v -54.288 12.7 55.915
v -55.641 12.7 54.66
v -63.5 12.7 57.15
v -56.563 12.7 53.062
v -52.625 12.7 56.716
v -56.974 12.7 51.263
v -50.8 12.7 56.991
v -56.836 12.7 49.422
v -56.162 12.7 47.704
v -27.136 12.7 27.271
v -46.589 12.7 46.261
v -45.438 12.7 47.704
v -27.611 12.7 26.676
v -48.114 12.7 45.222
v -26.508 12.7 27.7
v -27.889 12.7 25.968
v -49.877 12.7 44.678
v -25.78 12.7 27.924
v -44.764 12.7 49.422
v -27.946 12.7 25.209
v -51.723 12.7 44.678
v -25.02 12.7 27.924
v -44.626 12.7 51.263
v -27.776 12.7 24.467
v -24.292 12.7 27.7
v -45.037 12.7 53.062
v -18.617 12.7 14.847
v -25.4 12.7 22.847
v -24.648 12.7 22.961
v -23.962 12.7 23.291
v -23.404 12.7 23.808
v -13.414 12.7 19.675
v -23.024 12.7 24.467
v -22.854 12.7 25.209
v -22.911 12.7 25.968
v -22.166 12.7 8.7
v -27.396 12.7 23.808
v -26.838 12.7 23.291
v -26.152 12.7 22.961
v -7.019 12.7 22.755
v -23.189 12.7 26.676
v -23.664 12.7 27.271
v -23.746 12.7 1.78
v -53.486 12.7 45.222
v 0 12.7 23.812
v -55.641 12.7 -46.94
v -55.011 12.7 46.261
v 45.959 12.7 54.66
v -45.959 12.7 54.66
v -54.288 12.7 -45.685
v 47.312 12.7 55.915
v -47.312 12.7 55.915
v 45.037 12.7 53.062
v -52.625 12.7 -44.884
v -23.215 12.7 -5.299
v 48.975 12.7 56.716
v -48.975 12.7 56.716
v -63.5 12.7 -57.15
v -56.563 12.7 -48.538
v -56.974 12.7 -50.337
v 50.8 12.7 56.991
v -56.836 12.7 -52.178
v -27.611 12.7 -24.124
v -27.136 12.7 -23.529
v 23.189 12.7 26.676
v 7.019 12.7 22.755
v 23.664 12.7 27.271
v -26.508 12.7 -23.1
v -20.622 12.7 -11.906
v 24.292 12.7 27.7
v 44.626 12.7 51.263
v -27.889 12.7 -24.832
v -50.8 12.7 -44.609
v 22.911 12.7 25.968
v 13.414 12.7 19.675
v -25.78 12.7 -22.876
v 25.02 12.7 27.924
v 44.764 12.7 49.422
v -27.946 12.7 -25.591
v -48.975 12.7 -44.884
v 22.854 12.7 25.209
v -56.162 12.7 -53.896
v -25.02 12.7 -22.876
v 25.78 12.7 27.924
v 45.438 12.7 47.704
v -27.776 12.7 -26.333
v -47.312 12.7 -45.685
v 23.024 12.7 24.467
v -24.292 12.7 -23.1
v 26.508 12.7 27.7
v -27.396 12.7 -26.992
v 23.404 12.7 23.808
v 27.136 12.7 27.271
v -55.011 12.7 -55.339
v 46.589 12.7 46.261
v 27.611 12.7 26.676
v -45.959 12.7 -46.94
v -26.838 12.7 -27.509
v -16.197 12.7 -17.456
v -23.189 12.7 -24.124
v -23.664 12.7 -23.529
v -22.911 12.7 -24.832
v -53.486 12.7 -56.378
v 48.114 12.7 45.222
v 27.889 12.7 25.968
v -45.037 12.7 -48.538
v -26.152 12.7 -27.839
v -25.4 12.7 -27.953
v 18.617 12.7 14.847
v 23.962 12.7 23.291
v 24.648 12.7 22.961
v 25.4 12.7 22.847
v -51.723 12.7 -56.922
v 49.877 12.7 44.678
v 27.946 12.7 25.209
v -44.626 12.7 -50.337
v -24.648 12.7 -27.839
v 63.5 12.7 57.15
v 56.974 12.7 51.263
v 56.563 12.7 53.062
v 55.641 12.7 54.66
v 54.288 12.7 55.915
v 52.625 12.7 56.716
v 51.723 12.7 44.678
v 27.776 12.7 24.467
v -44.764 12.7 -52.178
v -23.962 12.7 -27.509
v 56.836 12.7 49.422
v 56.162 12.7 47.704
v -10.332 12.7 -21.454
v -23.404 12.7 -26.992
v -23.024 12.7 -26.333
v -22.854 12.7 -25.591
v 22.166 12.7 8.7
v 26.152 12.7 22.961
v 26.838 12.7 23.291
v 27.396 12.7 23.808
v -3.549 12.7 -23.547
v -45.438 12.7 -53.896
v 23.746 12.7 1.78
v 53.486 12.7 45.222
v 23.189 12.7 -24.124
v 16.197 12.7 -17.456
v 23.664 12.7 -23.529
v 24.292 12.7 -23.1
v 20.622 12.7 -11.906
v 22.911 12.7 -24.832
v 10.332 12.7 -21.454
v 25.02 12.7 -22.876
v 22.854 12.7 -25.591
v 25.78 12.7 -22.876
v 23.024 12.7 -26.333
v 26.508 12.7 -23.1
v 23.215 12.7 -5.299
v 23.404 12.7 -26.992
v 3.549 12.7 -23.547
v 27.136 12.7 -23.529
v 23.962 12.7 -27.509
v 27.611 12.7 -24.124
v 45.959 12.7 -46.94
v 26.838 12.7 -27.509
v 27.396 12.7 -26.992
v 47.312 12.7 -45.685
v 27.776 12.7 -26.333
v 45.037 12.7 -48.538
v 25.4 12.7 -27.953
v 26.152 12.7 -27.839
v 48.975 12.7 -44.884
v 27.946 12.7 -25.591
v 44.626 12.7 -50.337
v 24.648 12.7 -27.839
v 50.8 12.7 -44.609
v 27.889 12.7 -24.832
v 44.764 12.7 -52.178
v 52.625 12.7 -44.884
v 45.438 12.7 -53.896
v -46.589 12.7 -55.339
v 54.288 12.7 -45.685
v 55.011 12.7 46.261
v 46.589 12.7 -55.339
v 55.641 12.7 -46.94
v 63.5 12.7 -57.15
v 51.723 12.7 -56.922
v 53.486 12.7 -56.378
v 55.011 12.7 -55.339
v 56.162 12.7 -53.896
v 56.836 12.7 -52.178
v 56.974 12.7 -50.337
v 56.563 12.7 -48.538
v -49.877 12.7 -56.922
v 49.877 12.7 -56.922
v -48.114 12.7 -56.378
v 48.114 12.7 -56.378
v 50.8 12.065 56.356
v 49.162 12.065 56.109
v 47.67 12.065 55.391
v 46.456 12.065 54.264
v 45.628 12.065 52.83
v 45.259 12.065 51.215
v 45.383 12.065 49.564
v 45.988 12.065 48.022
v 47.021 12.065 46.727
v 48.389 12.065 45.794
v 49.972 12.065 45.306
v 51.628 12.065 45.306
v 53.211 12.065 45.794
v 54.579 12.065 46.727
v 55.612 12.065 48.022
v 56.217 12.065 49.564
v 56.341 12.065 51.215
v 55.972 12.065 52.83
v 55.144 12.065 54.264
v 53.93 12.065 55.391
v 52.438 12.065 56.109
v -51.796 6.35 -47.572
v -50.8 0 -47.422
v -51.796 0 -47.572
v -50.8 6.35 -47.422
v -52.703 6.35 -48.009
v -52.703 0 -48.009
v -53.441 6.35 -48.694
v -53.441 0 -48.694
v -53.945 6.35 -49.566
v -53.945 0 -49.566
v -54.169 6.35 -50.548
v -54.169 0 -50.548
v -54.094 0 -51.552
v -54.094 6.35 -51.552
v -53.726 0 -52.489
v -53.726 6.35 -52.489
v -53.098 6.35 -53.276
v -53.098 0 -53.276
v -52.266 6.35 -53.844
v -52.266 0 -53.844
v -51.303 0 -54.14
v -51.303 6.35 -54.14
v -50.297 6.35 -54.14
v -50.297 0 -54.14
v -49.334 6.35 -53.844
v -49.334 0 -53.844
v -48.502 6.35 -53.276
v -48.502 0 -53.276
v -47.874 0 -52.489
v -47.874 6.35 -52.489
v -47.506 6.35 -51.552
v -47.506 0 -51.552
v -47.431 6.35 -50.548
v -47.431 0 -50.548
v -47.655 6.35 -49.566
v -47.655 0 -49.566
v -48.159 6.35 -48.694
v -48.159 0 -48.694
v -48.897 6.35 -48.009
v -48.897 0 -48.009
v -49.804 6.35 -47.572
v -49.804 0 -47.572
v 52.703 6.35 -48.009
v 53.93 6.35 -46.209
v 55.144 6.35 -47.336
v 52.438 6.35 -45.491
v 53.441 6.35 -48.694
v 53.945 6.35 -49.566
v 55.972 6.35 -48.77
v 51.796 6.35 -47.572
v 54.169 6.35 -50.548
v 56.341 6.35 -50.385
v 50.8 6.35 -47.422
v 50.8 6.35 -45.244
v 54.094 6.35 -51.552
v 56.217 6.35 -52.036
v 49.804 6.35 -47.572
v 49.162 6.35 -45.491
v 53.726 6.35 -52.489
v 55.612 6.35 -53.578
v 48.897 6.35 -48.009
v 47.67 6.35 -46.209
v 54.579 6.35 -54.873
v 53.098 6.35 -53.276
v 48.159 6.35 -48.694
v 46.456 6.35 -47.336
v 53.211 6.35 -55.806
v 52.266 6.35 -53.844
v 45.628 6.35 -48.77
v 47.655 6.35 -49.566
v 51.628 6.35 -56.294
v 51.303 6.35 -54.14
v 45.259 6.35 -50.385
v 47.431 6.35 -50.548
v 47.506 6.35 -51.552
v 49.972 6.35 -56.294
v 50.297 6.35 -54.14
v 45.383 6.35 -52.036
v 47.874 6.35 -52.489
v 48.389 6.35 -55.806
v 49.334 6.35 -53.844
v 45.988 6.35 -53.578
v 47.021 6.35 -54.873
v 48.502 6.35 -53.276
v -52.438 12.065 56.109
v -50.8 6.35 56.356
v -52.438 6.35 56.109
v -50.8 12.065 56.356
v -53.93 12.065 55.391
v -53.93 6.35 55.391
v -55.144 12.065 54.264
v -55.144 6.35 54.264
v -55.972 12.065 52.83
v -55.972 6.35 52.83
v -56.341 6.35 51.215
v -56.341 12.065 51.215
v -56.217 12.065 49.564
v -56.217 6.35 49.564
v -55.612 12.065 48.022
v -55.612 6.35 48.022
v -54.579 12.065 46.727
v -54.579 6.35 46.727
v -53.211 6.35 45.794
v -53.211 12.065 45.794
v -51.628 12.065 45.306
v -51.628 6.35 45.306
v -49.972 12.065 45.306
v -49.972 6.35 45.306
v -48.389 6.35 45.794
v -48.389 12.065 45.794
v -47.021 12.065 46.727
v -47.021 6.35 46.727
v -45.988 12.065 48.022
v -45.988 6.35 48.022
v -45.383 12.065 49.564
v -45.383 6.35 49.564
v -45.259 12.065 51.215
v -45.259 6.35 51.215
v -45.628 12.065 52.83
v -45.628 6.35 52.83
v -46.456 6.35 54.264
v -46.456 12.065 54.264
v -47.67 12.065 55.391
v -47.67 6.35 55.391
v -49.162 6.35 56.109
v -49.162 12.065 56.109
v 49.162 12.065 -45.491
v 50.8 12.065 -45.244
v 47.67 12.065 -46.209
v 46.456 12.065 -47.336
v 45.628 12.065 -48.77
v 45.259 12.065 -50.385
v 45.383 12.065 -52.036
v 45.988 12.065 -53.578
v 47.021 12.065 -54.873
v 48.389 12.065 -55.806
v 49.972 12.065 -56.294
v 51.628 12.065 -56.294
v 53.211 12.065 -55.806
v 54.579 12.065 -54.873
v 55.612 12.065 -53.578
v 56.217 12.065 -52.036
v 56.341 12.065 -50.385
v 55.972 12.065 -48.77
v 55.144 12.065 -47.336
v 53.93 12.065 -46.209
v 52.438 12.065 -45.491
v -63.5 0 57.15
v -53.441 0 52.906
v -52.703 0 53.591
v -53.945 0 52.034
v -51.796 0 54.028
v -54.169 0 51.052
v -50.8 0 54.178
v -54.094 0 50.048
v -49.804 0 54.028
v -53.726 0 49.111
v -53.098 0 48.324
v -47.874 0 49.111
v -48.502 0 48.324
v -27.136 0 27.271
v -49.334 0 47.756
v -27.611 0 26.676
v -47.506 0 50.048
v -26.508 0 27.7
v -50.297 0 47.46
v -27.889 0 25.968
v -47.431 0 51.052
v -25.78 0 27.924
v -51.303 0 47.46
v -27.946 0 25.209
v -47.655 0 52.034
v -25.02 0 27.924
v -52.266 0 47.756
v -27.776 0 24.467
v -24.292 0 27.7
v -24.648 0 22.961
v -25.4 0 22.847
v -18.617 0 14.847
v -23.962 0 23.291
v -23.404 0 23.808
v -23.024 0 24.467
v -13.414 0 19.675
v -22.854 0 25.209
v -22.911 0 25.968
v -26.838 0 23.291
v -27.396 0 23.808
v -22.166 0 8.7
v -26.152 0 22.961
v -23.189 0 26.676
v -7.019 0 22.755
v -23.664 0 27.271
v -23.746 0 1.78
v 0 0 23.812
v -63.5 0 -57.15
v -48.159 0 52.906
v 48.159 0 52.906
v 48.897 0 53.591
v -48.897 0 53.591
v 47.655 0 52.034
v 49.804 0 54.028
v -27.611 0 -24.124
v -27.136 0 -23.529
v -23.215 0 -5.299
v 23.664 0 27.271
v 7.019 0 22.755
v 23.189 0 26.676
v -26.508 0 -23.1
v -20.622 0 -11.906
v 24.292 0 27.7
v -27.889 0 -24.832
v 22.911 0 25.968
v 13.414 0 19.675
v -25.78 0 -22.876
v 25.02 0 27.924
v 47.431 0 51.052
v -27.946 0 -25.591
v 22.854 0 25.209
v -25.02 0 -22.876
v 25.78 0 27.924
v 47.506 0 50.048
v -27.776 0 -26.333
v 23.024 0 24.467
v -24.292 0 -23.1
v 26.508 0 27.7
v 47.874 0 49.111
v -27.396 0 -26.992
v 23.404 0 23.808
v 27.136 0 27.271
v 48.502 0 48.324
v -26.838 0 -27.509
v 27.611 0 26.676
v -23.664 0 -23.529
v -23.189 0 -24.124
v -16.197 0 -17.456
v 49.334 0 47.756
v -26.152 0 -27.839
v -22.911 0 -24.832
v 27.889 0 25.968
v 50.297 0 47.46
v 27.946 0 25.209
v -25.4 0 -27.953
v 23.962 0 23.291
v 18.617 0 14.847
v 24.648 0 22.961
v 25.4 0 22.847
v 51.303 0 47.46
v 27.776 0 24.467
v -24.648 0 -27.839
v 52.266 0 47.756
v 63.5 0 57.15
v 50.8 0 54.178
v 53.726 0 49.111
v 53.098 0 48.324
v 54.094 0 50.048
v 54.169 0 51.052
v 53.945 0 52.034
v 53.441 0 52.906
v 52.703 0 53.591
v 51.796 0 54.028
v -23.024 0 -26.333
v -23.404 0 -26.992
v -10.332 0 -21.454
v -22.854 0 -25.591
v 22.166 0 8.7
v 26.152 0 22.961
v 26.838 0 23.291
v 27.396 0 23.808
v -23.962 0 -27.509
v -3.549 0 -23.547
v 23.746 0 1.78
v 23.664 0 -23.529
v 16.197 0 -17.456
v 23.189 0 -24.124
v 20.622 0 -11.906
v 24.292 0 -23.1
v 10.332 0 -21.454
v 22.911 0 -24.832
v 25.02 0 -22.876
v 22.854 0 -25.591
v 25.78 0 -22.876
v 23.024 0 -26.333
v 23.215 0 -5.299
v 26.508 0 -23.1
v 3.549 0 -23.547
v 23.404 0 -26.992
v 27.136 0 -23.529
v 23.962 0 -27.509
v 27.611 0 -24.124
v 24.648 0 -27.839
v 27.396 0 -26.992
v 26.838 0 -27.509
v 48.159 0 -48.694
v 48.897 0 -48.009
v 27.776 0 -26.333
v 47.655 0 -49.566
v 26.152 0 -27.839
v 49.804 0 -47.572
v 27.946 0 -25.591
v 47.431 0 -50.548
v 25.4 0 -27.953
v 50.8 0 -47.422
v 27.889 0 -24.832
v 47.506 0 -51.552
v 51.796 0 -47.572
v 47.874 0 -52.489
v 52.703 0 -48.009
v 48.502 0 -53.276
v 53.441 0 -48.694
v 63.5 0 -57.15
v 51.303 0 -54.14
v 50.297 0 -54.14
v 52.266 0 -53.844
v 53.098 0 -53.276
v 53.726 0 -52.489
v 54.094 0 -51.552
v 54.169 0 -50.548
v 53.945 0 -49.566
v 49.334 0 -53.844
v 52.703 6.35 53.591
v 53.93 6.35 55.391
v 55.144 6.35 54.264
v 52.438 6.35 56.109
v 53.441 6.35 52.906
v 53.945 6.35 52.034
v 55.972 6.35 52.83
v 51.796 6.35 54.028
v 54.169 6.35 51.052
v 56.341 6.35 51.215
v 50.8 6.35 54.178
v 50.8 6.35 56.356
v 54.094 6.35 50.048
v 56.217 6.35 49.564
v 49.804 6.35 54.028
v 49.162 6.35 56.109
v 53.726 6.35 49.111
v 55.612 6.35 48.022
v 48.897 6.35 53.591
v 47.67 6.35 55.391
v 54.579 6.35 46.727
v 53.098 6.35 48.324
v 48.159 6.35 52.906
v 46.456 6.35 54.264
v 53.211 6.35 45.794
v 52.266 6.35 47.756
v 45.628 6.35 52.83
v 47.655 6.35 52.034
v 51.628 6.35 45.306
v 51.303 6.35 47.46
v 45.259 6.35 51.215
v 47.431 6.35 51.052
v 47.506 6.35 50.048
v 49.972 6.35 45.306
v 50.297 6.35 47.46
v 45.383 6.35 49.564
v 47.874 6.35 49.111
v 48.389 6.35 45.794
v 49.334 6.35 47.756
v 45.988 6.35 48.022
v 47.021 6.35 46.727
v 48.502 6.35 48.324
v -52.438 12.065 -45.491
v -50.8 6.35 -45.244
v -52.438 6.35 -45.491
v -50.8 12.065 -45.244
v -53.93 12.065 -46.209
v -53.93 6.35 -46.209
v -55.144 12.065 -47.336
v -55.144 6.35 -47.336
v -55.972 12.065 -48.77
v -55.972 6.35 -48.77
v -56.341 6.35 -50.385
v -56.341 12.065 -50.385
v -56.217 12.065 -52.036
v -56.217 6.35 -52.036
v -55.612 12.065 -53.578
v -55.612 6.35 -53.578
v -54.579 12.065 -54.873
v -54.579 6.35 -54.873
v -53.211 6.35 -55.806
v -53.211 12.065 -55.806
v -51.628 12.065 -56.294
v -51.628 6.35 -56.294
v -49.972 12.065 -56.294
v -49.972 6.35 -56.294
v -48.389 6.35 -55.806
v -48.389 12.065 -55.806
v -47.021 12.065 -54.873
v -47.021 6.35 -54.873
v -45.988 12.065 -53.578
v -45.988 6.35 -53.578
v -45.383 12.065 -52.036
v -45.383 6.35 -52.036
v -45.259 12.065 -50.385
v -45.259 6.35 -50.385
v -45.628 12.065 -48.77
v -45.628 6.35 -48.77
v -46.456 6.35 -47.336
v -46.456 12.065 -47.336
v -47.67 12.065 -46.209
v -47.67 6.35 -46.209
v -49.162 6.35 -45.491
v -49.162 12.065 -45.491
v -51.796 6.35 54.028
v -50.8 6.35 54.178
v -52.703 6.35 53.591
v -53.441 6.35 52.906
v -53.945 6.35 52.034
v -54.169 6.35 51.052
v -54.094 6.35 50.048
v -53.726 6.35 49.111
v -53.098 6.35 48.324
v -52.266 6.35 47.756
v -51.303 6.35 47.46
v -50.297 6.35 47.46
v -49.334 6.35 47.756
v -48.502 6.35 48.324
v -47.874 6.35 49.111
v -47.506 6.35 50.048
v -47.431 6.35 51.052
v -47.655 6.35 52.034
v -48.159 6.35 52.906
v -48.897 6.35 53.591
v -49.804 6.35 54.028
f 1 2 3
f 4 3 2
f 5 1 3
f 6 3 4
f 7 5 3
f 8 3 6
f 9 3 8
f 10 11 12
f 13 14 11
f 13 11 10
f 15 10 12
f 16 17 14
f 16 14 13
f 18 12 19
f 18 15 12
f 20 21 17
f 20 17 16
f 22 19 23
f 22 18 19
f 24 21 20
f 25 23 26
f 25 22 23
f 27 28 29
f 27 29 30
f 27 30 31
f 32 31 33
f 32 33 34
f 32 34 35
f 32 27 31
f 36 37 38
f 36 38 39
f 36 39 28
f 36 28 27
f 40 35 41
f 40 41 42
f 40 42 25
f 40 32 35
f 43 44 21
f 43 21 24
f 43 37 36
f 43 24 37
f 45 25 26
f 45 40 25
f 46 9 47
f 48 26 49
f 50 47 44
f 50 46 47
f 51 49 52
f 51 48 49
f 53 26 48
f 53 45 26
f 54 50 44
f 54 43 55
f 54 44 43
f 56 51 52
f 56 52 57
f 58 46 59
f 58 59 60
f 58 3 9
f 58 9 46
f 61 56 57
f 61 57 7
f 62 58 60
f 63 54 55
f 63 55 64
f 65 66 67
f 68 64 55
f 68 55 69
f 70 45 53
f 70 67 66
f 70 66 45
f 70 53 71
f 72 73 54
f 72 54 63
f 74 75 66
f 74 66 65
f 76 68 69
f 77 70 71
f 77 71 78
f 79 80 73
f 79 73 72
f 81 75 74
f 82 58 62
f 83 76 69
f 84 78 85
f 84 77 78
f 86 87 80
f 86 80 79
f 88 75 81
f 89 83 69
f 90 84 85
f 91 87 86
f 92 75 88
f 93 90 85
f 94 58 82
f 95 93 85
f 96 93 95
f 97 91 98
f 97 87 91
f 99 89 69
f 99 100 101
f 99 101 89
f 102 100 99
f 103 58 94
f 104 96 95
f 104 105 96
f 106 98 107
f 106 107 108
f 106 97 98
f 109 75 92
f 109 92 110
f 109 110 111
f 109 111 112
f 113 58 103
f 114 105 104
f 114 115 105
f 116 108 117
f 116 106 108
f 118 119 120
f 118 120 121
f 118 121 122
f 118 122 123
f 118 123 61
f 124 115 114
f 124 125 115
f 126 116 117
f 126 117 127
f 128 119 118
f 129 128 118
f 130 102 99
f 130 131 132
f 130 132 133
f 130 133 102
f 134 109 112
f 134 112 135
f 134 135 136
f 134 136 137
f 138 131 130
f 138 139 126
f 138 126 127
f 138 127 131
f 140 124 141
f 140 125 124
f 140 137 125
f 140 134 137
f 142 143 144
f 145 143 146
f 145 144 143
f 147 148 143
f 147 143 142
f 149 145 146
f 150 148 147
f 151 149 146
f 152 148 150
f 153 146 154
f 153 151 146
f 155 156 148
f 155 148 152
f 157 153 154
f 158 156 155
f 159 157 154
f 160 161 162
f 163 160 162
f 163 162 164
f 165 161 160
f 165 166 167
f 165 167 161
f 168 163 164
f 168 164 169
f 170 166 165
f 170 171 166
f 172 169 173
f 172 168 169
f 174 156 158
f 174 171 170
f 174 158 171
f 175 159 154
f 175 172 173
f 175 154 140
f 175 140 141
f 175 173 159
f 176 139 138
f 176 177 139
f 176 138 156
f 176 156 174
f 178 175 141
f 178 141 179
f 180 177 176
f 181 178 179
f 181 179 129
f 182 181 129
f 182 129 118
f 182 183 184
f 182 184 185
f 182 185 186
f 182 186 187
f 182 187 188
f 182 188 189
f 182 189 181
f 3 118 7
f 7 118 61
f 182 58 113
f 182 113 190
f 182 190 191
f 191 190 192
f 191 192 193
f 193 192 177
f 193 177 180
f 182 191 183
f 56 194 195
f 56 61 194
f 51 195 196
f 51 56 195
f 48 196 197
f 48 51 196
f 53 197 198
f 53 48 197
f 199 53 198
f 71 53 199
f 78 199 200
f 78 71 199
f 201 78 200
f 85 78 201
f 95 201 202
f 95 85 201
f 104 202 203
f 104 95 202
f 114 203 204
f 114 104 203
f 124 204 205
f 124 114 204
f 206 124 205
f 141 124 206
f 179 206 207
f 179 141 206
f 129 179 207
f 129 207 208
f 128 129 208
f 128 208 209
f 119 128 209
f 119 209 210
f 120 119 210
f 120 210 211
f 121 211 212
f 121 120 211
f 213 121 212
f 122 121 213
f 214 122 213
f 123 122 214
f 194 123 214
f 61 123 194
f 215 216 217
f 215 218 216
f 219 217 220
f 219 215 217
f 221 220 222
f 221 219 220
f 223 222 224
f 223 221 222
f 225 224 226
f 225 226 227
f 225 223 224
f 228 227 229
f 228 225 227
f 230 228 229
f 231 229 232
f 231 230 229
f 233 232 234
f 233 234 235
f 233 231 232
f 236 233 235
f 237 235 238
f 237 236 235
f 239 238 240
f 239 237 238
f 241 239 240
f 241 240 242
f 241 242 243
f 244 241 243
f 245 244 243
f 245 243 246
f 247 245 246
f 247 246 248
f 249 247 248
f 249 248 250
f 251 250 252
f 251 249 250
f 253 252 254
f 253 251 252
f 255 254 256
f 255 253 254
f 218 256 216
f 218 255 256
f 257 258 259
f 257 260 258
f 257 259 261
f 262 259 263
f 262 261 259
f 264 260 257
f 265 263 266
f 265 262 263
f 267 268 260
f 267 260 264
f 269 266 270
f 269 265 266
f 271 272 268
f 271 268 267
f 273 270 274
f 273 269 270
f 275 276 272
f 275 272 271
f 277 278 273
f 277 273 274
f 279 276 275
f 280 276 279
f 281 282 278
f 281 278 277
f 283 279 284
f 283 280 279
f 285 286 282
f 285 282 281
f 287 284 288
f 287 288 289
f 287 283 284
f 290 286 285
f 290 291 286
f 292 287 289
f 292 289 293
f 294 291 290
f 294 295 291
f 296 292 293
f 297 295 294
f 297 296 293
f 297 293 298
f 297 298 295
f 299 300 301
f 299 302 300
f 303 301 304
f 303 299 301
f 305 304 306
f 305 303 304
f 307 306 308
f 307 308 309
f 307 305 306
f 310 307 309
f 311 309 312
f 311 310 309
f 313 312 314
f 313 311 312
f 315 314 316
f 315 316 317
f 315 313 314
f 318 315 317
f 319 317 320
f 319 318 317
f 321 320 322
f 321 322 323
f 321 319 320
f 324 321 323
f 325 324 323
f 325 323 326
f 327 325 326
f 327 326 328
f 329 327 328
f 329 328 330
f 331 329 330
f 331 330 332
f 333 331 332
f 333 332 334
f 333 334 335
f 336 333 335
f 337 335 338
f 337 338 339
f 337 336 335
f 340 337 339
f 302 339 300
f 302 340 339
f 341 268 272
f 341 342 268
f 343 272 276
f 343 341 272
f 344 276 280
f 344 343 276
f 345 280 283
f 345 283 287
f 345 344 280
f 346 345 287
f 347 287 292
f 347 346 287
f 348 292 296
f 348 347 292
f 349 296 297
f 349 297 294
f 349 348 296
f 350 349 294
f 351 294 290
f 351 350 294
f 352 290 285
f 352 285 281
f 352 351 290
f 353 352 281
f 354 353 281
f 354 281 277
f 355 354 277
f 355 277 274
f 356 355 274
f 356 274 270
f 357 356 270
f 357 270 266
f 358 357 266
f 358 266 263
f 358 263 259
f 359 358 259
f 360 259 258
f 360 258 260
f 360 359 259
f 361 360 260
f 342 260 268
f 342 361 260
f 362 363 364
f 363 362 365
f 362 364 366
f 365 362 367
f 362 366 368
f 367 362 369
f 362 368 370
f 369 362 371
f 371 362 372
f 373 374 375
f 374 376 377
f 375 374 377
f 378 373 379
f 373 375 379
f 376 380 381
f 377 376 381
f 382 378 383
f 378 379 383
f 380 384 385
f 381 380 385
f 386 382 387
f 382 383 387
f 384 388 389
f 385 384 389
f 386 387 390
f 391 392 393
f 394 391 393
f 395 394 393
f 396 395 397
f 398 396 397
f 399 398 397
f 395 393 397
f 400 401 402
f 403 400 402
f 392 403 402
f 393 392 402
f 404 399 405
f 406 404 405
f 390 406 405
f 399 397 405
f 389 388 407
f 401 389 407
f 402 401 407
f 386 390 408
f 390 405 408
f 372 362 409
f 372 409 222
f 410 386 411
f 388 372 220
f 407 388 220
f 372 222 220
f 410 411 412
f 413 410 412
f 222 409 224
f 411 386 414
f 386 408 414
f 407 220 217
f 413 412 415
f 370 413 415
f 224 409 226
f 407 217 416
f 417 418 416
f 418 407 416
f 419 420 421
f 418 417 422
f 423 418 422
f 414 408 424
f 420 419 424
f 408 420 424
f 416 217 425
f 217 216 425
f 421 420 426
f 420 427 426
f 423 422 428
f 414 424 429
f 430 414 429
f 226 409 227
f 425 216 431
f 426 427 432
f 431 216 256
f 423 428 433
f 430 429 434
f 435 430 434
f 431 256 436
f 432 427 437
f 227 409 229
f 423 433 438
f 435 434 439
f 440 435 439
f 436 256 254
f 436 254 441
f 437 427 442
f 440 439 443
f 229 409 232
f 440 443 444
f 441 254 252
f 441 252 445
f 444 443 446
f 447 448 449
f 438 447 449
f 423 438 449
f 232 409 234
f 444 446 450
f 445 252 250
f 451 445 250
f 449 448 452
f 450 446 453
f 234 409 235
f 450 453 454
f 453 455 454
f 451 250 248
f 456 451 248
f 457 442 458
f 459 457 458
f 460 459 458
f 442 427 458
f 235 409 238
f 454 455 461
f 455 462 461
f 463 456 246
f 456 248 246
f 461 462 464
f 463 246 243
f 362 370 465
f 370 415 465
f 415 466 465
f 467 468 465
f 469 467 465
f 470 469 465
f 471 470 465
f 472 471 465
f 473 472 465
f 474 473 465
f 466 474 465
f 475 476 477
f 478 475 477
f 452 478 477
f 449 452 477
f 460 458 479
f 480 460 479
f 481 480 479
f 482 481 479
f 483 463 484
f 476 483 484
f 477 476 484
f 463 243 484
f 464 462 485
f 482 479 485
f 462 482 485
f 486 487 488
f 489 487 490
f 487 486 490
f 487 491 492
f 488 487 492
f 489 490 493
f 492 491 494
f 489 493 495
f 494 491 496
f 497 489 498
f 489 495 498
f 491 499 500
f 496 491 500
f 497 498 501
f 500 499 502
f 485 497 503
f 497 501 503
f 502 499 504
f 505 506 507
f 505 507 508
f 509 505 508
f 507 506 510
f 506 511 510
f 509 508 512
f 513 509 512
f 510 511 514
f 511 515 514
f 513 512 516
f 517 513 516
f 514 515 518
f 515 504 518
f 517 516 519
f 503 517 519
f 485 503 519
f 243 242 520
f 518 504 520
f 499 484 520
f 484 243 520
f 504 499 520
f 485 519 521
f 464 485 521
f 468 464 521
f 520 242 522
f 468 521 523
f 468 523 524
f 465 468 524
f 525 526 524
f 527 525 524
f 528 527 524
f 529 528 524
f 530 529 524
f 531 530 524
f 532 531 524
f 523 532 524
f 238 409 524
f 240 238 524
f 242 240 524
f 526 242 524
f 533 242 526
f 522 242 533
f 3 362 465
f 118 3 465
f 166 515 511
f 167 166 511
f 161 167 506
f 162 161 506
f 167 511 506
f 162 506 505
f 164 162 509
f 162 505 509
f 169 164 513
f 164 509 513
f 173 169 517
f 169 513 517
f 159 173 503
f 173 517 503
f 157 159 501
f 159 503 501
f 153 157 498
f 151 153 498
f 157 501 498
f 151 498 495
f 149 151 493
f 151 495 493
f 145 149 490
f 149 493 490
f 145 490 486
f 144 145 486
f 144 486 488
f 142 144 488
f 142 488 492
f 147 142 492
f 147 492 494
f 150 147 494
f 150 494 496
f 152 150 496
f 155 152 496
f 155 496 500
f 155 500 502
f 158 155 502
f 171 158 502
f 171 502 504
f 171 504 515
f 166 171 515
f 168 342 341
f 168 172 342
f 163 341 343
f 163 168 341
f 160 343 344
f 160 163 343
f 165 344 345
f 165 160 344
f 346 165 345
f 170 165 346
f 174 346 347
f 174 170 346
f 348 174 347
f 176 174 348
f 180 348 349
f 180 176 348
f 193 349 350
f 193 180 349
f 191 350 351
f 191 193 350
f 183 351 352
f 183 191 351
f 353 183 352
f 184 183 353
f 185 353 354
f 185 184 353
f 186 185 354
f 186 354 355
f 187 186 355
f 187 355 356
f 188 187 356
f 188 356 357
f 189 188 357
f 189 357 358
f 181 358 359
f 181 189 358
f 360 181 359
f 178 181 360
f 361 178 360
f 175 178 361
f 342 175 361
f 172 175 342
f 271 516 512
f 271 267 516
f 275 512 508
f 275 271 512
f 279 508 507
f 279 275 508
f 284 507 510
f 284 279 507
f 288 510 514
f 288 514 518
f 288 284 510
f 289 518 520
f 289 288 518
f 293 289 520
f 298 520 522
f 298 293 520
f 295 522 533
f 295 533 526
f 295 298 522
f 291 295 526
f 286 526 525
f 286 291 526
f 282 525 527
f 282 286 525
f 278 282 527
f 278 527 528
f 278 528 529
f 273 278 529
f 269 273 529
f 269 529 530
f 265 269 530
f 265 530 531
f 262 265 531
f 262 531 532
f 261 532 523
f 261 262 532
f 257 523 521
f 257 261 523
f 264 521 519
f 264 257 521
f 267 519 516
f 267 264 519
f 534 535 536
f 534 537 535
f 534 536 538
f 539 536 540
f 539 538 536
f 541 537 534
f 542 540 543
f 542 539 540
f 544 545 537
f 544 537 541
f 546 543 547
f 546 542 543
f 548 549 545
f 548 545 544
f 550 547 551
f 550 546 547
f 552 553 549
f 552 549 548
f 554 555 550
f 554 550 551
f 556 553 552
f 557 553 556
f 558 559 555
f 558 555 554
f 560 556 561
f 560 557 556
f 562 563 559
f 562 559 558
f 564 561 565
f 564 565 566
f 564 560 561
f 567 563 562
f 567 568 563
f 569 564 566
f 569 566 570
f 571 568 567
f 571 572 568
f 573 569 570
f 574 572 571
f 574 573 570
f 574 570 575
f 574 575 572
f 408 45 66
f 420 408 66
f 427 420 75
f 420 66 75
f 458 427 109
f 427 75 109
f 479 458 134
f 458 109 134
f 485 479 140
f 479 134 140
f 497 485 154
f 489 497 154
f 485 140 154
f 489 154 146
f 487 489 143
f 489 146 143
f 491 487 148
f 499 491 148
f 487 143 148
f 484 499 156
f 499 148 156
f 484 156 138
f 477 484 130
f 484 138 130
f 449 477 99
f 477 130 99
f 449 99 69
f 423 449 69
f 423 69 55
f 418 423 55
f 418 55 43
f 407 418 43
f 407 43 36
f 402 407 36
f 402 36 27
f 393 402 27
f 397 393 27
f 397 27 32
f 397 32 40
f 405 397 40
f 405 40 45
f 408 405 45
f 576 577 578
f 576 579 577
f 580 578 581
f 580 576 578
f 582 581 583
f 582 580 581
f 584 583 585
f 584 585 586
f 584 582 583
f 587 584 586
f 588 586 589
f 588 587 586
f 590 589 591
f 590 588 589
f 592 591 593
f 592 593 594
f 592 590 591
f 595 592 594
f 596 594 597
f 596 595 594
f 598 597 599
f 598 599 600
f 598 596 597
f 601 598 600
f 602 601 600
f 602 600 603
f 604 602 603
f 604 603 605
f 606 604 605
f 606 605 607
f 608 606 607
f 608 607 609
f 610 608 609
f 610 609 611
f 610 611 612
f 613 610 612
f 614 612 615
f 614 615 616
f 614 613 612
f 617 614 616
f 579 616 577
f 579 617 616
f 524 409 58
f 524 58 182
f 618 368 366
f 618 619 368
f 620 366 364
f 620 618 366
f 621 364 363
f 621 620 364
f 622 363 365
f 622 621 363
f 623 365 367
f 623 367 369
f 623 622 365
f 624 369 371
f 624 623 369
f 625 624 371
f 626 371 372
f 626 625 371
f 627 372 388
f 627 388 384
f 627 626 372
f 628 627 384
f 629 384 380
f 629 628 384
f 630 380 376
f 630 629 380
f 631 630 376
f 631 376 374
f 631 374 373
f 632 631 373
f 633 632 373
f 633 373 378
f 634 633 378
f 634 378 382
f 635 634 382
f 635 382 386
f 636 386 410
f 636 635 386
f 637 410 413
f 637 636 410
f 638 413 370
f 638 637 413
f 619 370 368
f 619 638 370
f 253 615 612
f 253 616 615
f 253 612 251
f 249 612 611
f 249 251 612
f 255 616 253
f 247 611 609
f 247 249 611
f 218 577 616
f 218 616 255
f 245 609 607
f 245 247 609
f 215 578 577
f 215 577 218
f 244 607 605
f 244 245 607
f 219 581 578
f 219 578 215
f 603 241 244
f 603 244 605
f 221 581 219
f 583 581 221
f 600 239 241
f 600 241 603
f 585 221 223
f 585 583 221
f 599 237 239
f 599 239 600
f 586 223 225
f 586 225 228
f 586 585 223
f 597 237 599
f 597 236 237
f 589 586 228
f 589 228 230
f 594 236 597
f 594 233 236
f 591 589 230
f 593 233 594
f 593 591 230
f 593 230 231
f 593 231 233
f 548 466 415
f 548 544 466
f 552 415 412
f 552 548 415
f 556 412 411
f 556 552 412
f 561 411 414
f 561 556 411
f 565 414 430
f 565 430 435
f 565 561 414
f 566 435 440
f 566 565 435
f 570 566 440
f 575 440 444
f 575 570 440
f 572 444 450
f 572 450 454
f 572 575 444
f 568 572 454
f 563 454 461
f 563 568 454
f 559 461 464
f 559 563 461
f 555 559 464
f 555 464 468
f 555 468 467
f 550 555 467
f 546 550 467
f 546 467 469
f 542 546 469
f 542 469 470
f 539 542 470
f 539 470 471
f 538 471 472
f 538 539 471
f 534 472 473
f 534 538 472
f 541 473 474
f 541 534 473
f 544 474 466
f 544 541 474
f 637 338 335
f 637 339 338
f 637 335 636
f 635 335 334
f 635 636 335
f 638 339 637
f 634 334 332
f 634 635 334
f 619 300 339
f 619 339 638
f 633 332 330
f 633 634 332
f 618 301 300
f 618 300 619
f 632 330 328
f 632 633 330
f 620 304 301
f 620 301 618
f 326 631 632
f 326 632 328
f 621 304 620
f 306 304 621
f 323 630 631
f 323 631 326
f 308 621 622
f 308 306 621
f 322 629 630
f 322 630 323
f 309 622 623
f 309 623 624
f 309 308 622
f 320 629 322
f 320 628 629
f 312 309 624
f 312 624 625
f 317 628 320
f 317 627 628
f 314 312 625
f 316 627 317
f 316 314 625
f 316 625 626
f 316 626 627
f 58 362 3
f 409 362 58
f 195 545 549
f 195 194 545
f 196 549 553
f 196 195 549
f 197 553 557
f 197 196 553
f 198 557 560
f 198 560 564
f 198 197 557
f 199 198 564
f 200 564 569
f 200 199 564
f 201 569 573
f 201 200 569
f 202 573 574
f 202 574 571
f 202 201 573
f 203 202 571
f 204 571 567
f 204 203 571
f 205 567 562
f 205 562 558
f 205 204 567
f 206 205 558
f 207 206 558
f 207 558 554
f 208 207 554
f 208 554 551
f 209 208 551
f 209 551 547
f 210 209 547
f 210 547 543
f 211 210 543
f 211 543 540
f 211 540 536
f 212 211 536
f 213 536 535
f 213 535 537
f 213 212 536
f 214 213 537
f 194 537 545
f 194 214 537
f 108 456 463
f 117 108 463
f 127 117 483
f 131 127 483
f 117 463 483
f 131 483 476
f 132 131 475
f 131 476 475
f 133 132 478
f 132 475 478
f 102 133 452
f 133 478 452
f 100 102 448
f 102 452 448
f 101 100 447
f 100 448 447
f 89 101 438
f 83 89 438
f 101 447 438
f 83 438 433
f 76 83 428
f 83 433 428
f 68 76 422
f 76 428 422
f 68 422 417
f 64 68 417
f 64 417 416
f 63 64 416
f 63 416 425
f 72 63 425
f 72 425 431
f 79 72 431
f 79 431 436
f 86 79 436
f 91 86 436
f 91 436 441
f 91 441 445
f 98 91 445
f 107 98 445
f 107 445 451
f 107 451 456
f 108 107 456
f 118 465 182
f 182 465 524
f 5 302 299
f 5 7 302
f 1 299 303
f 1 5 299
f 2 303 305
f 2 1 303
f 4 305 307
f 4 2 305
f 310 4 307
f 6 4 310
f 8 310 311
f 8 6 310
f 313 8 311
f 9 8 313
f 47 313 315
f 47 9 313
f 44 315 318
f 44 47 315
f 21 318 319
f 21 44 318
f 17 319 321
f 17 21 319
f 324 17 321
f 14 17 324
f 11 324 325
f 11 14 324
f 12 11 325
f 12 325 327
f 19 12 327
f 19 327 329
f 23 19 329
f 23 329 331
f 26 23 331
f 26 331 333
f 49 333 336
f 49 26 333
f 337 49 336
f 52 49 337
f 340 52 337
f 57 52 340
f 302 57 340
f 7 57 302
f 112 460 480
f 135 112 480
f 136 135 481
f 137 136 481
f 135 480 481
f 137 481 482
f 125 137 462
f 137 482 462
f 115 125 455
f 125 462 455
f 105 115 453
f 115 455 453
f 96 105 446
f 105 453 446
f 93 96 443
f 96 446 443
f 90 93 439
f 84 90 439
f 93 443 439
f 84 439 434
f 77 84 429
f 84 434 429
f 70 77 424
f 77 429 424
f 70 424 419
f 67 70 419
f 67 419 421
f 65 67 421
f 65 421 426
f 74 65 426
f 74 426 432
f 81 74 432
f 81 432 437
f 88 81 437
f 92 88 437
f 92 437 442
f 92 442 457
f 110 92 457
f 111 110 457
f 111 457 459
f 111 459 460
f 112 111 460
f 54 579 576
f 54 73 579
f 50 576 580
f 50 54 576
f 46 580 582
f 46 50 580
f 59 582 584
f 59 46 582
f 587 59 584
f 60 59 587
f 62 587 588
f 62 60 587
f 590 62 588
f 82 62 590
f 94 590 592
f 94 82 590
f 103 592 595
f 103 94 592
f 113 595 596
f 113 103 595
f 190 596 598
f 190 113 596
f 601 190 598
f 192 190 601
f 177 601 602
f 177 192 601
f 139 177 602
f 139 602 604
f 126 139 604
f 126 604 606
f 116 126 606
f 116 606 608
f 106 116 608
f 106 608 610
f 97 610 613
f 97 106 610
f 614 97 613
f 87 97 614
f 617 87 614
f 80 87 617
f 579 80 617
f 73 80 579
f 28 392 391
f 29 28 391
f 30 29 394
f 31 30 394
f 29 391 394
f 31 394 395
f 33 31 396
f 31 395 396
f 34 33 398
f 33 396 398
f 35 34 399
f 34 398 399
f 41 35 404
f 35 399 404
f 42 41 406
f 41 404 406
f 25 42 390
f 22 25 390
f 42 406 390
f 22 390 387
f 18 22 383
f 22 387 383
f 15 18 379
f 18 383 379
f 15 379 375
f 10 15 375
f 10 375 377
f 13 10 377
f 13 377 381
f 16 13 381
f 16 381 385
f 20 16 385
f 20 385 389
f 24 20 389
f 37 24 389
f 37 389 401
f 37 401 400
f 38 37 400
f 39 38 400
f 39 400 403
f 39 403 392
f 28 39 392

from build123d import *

# Parameters (mm, degrees)
SKETCH1_W                                     = 127
SKETCH1_H                                     = 114.3
BOSS_EXTRUDE1_DEPTH                           = 12.7
SKETCH2_R                                     = 23.8125
CUT_EXTRUDE1_DEPTH                            = 87.36933773
CBORE_FOR_1_4_SOCKET_HEAD_CAP_SCREW1_AT_COUNT = 2
CBORE_FOR_1_4_SOCKET_HEAD_CAP_SCREW1_AT_PITCH = 101.6
CBORE_FOR_1_4_SOCKET_HEAD_CAP_SCREW1_2_COUNT  = 2
CBORE_FOR_1_4_SOCKET_HEAD_CAP_SCREW1_2_PITCH  = 143.684097937
CBORE_FOR_1_4_SOCKET_HEAD_CAP_SCREW1_3_COUNT  = 2
CBORE_FOR_1_4_SOCKET_HEAD_CAP_SCREW1_3_PITCH  = 101.6
F_1_4_20_TAPPED_HOLE1_D                       = 5.1054
F_1_4_20_TAPPED_HOLE1_DEPTH                   = 16.51
F_1_4_20_TAPPED_HOLE1_TIP                     = 1.533816902


with BuildPart() as part:
    # Sketch1 → Boss-Extrude1 (new body)
    with BuildSketch(Plane(origin=(0, 0, 0), x_dir=(1, 0, 0), z_dir=(0, 1, 0))):
        Rectangle(SKETCH1_W, SKETCH1_H)
    extrude(amount=BOSS_EXTRUDE1_DEPTH)

    # Sketch2 → Cut-Extrude1 (cut, through all)
    with BuildSketch(Plane(origin=(0, 12.7, 0), x_dir=(1, 0, 0), z_dir=(0, 1, 0))):
        with Locations(Location((0, 0, 0), (0, 0, 270))):
            Circle(SKETCH2_R)
    extrude(amount=-CUT_EXTRUDE1_DEPTH, mode=Mode.SUBTRACT)

    # Sketch5 → CBORE for 1/4 Socket Head Cap Screw1 (revolve, cut)
    with BuildSketch(Plane(origin=(-50.8, 12.7, -50.8), x_dir=(0, 0, 1), z_dir=(1, 0, 0))):
        Polygon((0, 0), (0, 12.7), (3.3782, 12.7), (3.3782, 6.35), (5.55625, 6.35), (5.55625, 0.635), (6.19125, 0), align=None)
    cbore_for_1_4_socket_head_cap_screw1 = revolve(axis=Axis((-50.8, 19.05, -50.8), (0, -1, 0)), mode=Mode.SUBTRACT)

    # CBORE for 1/4 Socket Head Cap Screw1 at: CBORE for 1/4 Socket Head Cap Screw1 ×2
    with Locations(*[(i * CBORE_FOR_1_4_SOCKET_HEAD_CAP_SCREW1_AT_PITCH, 0, 0) for i in range(1, CBORE_FOR_1_4_SOCKET_HEAD_CAP_SCREW1_AT_COUNT)]):
        add(cbore_for_1_4_socket_head_cap_screw1, mode=Mode.SUBTRACT)

    # CBORE for 1_4 Socket Head Cap Screw1 2: CBORE for 1/4 Socket Head Cap Screw1 ×2
    with Locations(*[Vector(0.7071067811865476, 0, 0.7071067811865475) * (i * CBORE_FOR_1_4_SOCKET_HEAD_CAP_SCREW1_2_PITCH) for i in range(1, CBORE_FOR_1_4_SOCKET_HEAD_CAP_SCREW1_2_COUNT)]):
        add(cbore_for_1_4_socket_head_cap_screw1, mode=Mode.SUBTRACT)

    # CBORE for 1_4 Socket Head Cap Screw1 3: CBORE for 1/4 Socket Head Cap Screw1 ×2
    with Locations(*[(0, 0, i * CBORE_FOR_1_4_SOCKET_HEAD_CAP_SCREW1_3_PITCH) for i in range(1, CBORE_FOR_1_4_SOCKET_HEAD_CAP_SCREW1_3_COUNT)]):
        add(cbore_for_1_4_socket_head_cap_screw1, mode=Mode.SUBTRACT)

    # 1/4-20 Tapped Hole1
    with Locations(Plane(origin=(-25.4, 12.7, -25.4), x_dir=(0, 0, 1), z_dir=(0, 1, 0))):
        with Locations((0, 0), (0, 50.8), (50.8, 50.8), (50.8, 0)):
            Hole(F_1_4_20_TAPPED_HOLE1_D / 2, depth=F_1_4_20_TAPPED_HOLE1_DEPTH)
            with Locations((0, 0, -(F_1_4_20_TAPPED_HOLE1_DEPTH + F_1_4_20_TAPPED_HOLE1_TIP / 2))):  # 118° drill point
                Cone(0, F_1_4_20_TAPPED_HOLE1_D / 2, F_1_4_20_TAPPED_HOLE1_TIP, mode=Mode.SUBTRACT)


solid = part.part
